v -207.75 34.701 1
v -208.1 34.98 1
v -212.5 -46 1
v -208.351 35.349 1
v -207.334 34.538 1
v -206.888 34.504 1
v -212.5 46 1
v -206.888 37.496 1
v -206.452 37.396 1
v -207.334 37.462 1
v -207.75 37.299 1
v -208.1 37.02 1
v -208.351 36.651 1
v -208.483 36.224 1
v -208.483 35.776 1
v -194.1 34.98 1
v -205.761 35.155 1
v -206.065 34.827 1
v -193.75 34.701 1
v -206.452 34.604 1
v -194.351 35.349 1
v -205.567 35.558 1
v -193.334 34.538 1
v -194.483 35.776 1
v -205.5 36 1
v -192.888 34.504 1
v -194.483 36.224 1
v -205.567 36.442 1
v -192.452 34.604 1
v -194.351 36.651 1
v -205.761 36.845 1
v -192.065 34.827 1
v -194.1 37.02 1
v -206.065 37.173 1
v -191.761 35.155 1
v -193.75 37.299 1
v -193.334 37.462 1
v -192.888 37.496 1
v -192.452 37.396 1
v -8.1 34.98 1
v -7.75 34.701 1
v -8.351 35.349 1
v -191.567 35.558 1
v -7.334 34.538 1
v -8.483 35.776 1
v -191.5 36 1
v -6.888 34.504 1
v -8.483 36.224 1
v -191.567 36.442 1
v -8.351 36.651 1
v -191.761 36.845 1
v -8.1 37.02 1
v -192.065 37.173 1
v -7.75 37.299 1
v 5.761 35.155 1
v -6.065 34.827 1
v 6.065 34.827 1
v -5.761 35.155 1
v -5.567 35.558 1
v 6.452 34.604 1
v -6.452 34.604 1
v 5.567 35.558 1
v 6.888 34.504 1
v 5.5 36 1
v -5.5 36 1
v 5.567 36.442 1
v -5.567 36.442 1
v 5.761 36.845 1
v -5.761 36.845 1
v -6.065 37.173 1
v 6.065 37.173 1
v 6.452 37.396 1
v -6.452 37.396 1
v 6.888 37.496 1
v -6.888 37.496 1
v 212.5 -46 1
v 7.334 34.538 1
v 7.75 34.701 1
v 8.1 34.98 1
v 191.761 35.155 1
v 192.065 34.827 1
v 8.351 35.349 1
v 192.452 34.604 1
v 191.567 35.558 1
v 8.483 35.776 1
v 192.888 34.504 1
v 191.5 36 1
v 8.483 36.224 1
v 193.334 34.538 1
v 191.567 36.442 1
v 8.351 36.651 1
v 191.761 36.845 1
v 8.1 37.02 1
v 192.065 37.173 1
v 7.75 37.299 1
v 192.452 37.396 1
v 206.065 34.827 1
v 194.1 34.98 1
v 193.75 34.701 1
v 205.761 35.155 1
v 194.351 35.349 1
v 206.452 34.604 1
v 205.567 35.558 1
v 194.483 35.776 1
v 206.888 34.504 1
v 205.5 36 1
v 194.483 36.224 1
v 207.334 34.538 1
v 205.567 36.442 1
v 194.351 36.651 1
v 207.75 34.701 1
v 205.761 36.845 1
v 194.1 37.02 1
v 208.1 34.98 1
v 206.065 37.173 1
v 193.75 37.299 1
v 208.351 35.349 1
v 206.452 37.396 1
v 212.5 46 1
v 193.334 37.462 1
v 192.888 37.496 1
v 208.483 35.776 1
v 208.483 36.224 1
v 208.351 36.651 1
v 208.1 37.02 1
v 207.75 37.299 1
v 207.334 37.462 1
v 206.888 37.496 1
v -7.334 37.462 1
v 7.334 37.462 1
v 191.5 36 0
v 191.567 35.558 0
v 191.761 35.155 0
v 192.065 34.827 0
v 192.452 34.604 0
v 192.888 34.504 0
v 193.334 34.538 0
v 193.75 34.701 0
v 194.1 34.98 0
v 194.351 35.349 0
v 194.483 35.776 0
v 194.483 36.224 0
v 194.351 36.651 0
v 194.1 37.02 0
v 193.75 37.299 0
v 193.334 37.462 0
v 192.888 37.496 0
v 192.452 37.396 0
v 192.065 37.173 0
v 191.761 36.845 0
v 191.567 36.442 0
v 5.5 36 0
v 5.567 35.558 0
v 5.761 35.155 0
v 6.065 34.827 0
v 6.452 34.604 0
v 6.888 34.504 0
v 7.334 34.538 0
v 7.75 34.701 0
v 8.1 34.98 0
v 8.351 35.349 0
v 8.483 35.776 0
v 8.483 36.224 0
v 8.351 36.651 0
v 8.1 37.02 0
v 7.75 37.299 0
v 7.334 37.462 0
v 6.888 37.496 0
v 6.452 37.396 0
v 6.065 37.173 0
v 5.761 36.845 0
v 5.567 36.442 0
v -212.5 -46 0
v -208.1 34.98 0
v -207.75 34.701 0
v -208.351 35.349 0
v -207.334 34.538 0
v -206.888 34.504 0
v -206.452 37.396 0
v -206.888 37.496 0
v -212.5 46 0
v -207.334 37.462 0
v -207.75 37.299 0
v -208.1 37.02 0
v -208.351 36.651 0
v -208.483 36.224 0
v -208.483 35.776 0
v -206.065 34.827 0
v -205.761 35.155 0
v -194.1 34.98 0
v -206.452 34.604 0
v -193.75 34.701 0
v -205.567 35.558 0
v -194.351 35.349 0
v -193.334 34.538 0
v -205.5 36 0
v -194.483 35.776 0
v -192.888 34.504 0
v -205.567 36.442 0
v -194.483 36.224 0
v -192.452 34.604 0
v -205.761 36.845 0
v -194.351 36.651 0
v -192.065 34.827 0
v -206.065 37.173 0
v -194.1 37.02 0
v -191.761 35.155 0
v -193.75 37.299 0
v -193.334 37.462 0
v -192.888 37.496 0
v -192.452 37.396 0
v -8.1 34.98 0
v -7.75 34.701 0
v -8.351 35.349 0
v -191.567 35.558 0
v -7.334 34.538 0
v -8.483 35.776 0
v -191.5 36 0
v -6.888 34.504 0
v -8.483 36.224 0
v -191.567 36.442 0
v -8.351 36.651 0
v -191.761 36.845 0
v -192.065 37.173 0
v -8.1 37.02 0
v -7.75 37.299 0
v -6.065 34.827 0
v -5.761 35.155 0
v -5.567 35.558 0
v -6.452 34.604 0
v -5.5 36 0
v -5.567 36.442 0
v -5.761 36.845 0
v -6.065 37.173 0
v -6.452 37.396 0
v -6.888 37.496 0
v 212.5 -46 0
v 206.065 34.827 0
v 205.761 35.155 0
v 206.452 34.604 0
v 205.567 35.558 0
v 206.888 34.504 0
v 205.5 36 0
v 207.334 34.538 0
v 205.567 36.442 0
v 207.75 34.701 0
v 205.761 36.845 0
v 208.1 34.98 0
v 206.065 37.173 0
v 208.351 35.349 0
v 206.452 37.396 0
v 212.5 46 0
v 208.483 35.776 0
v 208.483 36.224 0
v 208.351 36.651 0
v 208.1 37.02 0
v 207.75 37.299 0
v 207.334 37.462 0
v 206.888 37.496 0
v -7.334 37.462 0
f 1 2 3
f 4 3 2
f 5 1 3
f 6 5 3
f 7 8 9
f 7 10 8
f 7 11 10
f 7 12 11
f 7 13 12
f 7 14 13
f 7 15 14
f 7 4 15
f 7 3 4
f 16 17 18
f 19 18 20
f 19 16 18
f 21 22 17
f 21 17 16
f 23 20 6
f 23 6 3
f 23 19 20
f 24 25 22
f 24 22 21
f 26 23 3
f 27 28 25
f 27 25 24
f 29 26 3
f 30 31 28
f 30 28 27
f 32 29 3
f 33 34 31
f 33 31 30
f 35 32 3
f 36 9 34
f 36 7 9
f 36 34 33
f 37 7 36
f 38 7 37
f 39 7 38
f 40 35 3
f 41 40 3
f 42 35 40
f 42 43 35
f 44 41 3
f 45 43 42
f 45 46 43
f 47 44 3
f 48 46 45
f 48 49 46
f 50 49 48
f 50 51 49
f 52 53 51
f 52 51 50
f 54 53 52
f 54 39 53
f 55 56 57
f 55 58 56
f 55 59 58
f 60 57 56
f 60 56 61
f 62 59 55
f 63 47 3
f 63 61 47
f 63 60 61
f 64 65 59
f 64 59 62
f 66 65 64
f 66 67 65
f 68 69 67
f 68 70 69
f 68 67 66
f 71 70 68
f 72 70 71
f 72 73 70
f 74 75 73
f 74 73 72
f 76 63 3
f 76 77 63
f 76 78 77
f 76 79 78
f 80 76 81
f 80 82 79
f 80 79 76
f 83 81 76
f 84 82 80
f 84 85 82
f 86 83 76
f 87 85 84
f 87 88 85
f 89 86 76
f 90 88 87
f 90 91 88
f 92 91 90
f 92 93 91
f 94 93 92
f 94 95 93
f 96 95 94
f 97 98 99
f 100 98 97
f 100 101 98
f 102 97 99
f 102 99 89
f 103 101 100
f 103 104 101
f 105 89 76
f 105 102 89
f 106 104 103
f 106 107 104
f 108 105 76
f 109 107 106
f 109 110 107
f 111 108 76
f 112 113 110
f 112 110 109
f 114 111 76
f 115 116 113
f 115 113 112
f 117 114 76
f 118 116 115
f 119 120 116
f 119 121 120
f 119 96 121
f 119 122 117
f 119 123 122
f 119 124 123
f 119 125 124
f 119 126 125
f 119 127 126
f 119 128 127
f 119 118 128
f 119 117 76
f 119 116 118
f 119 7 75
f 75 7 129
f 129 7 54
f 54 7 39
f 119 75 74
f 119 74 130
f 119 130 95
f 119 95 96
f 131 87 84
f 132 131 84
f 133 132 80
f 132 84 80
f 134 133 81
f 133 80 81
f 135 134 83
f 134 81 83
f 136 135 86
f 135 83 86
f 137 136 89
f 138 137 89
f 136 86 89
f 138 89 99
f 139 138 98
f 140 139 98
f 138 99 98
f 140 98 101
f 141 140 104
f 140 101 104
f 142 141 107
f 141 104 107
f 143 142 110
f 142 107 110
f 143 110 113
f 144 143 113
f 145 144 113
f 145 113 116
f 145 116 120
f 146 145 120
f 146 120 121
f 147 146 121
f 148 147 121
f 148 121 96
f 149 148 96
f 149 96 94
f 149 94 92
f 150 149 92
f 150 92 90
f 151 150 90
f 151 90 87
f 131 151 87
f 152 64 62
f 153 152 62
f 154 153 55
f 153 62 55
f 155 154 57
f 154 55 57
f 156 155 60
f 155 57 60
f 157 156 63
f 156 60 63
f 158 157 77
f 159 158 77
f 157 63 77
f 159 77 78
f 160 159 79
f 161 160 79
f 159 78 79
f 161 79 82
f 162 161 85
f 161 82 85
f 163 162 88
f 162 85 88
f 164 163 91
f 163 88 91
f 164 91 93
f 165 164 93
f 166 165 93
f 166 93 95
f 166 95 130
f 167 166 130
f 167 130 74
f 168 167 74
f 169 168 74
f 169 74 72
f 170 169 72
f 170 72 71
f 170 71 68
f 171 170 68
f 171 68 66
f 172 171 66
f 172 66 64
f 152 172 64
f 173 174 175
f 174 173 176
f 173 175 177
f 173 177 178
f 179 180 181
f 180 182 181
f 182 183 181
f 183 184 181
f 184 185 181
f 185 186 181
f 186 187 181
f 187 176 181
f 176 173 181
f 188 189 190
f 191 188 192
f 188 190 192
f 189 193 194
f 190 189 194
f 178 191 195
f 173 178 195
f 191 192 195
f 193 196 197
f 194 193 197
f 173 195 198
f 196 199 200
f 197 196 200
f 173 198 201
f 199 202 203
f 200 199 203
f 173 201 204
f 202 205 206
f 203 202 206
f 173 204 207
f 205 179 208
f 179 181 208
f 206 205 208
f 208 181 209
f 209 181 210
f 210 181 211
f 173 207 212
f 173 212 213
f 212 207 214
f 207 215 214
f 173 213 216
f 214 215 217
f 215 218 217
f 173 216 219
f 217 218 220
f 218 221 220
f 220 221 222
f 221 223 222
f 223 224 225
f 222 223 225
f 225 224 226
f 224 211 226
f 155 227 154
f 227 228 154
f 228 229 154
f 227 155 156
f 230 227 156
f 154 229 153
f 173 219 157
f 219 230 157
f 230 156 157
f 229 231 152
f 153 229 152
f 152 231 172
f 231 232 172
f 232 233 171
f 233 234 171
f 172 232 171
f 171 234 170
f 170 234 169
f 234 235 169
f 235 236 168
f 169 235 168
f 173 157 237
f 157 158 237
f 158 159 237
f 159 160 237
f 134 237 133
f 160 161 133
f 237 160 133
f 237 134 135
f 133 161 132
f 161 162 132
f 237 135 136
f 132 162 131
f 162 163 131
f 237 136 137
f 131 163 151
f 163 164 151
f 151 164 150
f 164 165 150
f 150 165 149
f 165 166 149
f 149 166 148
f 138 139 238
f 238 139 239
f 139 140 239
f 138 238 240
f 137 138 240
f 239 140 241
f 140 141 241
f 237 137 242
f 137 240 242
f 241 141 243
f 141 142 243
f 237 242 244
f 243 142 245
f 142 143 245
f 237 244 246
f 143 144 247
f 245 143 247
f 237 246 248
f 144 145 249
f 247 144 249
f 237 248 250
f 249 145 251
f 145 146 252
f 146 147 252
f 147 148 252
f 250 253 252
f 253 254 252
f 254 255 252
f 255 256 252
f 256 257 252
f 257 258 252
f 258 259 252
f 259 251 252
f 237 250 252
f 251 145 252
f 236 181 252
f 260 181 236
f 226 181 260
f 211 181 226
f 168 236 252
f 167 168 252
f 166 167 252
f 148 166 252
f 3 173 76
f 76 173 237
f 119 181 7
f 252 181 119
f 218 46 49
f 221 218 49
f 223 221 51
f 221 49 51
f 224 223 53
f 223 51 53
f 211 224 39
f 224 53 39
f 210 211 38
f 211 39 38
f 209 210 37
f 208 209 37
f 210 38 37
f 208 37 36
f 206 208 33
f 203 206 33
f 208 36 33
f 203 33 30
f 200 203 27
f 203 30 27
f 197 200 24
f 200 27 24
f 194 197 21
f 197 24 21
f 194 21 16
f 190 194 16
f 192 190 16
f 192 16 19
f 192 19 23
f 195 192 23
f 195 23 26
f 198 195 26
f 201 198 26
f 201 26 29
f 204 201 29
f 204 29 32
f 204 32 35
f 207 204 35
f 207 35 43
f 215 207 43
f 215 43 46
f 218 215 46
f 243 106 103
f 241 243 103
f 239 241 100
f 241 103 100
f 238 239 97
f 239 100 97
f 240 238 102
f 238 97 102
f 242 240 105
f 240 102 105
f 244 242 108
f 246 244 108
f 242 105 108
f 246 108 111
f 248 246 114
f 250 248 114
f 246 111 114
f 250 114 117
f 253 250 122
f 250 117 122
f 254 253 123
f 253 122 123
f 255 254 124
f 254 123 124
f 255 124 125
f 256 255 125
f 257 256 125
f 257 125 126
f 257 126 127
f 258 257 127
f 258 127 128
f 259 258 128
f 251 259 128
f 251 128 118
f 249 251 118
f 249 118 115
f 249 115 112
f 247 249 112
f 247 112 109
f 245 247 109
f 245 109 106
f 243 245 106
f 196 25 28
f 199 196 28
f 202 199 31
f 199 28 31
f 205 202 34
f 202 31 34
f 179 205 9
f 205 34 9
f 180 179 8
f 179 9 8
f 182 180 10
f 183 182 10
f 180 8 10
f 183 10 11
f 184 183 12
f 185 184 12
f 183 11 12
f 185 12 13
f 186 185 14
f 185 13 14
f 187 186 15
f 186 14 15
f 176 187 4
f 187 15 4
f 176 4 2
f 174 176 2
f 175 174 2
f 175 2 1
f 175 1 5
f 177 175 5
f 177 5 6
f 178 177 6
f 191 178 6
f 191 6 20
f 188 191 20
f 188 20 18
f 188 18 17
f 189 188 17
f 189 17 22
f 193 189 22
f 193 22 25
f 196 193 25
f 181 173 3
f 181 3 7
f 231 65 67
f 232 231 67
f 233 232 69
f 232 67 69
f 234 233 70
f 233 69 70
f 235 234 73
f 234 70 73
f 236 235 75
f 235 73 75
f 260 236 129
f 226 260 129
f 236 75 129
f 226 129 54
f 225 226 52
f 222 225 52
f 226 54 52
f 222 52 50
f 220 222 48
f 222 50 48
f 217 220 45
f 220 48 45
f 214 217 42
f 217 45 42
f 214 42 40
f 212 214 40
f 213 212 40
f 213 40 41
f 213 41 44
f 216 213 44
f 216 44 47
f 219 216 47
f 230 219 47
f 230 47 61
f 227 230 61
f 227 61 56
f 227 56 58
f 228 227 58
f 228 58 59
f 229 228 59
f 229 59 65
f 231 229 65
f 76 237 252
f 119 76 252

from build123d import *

# Parameters (mm, degrees)
SKETCH_1_W          = 425
SKETCH_1_H          = 92
EXTRUDE_1_DEPTH     = 1
SKETCH_2_R          = 1.5
CUT_EXTRUDE_1_DEPTH = 218.424124696


with BuildPart() as part:
    # 草图1 → 凸台-拉伸1 (new body)
    with BuildSketch(Plane.XY):
        Rectangle(SKETCH_1_W, SKETCH_1_H)
    extrude(amount=EXTRUDE_1_DEPTH)

    # 草图2 → 切除-拉伸1 (cut, through all)
    with BuildSketch(Plane.XY.offset(1)):
        with Locations((-7, 36)):
            Circle(SKETCH_2_R)
        with Locations((-207, 36)):
            Circle(SKETCH_2_R)
        with Locations((-193, 36)):
            Circle(SKETCH_2_R)
        with Locations(Location((193, 36, 0), (0, 0, 180))):
            Circle(SKETCH_2_R)
        with Locations(Location((207, 36, 0), (0, 0, 180))):
            Circle(SKETCH_2_R)
        with Locations(Location((7, 36, 0), (0, 0, 180))):
            Circle(SKETCH_2_R)
    extrude(amount=-CUT_EXTRUDE_1_DEPTH, mode=Mode.SUBTRACT)


solid = part.part
